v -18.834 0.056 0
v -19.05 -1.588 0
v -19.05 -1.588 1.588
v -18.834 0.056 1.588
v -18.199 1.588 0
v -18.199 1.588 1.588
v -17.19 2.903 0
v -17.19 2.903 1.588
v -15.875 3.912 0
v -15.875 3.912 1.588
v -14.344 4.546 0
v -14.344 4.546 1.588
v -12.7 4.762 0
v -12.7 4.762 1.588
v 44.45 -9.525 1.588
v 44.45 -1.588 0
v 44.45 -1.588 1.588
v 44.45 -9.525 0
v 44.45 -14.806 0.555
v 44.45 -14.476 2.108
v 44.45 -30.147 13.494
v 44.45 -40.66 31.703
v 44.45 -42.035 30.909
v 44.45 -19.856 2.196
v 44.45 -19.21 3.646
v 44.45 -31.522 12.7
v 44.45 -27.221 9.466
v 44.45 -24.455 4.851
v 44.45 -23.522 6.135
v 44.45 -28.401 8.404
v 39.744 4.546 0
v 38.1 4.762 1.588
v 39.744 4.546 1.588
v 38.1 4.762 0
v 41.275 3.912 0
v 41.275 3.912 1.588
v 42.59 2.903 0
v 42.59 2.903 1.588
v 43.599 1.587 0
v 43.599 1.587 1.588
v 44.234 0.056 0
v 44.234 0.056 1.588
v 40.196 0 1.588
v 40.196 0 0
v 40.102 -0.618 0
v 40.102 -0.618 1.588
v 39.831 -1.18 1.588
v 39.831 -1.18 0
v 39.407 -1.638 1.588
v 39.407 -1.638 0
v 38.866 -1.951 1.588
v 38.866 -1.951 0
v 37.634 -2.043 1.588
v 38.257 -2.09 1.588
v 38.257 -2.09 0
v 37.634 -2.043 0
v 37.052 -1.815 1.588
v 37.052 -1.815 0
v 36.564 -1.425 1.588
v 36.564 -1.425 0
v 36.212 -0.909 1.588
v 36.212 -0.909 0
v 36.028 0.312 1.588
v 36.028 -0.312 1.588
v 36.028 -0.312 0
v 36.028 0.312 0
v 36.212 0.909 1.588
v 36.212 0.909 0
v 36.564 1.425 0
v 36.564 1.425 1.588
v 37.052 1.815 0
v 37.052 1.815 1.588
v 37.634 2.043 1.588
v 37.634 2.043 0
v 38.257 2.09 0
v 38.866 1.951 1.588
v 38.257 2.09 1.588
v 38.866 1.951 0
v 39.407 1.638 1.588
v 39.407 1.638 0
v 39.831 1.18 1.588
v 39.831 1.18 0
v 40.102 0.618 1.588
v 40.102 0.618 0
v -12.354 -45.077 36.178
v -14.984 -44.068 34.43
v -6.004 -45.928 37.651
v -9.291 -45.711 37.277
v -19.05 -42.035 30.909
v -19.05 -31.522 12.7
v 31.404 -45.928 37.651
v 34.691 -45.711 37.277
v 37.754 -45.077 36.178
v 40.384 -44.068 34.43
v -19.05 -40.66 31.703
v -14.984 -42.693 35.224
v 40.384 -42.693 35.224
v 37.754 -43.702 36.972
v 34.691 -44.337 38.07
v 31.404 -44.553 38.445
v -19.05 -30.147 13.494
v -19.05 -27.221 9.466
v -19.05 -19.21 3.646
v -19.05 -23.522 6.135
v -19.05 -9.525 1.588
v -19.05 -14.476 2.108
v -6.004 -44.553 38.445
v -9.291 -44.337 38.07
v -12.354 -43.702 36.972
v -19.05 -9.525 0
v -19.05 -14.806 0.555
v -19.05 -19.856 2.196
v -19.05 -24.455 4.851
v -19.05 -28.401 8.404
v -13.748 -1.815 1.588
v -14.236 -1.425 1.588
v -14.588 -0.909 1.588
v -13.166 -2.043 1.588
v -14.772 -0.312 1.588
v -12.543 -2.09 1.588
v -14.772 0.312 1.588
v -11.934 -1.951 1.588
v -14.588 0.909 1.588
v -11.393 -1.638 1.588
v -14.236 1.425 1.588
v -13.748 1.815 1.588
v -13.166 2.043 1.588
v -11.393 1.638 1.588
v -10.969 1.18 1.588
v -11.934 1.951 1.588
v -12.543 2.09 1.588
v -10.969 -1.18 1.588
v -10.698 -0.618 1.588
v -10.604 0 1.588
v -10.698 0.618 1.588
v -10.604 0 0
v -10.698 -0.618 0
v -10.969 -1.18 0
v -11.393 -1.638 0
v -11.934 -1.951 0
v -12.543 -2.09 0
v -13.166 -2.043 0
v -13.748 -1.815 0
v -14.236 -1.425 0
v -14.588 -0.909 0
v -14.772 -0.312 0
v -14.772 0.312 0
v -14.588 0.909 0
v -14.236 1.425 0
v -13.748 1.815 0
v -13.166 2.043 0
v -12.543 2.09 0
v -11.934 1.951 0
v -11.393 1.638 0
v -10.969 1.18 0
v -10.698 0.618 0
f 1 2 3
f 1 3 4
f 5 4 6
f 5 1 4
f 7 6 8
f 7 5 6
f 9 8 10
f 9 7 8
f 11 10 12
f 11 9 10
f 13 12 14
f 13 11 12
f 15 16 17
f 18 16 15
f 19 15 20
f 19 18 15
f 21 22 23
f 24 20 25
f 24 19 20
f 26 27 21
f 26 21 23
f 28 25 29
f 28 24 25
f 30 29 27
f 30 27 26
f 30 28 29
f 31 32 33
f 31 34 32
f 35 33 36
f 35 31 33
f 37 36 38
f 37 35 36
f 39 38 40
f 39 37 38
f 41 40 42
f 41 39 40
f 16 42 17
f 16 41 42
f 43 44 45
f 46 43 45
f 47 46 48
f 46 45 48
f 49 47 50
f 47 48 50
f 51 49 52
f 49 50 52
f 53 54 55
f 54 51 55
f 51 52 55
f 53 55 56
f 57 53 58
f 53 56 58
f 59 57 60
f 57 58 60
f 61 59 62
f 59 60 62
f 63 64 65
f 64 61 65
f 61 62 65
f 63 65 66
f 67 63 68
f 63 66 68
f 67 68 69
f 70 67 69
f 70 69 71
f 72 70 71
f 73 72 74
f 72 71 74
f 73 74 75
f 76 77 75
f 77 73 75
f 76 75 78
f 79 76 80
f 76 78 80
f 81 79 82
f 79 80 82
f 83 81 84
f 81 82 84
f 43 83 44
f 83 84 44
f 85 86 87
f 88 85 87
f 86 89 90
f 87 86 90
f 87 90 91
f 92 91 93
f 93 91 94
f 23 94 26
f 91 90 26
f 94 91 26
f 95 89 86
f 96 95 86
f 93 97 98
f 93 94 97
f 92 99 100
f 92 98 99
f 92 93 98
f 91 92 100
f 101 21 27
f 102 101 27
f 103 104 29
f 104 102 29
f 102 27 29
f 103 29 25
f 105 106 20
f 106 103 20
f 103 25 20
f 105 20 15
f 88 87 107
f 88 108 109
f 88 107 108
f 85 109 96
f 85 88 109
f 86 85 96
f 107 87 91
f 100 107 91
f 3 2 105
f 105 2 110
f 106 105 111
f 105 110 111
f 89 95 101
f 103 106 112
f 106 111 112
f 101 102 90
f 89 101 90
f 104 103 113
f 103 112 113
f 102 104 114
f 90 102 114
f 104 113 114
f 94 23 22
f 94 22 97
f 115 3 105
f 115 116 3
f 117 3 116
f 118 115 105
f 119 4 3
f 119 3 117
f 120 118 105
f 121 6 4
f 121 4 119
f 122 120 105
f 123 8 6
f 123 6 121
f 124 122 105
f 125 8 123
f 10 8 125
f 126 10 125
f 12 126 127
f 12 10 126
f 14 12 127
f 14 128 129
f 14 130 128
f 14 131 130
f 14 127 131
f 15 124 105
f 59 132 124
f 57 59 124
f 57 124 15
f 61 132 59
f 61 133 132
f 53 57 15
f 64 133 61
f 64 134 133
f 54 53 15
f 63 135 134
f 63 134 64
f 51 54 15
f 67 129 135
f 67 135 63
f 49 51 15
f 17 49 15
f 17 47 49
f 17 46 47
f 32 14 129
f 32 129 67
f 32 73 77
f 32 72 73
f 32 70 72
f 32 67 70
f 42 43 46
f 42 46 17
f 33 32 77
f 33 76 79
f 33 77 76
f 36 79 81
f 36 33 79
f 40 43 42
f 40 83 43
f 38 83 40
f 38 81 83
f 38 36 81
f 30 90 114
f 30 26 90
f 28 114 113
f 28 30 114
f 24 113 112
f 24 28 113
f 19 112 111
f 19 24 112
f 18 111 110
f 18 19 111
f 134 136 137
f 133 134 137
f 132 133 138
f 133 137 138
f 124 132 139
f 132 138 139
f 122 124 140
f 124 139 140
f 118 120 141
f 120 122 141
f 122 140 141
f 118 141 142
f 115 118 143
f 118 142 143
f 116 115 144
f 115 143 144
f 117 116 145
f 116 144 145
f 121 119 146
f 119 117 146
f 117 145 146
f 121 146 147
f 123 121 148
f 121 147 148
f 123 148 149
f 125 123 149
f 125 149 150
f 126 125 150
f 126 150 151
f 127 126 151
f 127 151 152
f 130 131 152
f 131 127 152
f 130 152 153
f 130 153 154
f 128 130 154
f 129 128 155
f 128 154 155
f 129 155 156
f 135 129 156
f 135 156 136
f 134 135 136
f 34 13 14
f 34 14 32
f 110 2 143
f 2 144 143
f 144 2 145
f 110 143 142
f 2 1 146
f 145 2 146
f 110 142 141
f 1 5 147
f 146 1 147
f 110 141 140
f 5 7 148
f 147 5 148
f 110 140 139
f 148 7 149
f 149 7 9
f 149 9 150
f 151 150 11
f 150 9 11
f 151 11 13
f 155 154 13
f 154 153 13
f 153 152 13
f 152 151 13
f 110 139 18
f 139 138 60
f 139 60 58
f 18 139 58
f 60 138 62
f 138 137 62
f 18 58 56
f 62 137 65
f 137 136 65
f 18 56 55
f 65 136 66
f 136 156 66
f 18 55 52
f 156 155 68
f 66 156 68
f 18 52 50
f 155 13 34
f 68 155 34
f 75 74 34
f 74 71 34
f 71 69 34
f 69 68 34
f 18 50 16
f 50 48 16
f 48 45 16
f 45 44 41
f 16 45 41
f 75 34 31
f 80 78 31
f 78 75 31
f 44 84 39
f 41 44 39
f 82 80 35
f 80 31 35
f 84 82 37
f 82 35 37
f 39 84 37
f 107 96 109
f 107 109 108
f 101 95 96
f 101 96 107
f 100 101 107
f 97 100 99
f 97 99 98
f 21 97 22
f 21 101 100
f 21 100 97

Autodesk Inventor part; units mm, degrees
ref_plane "YZ Plane" through (0, 0, 0) normal (1, 0, 0) x (0, 1, 0)
ref_plane "XZ Plane" through (0, 0, 0) normal (0, 1, 0) x (-1, 0, 0)
ref_plane "XY Plane" through (0, 0, 0) normal (0, 0, 1) x (1, 0, 0)
sketch "Sketch1" plane through (0, 0, 0) normal (0, 0, 1) x (1, 0, 0)
  line L0 (-12.7, 4.7625) -> (38.1, 4.7625)
  line L1 (-15.875, -9.525) -> (44.45, -9.525)
  line L2 (-19.05, -1.5875) -> (-19.05, -26.8352)
  line L3 (44.45, -1.5875) -> (44.45, -30.4886)
  line L4 (-19.05, -9.525) -> (-15.875, -9.525)
  arc A0 (-12.7, 4.7625) -> (-19.05, -1.5875) centre (-12.7, -1.5875) ccw
  arc A1 (44.45, -1.5875) -> (38.1, 4.7625) centre (38.1, -1.5875) ccw
  line L5 (-19.05, -26.8352) -> (-19.05, -57.15)
  line L6 (-6.0043, -64.9352) -> (31.4043, -64.9352)
  line L7 (44.45, -57.15) -> (44.45, -30.4886)
  line L8 (-19.05, -57.15) -> (-14.9845, -61.2155)
  line L9 (-19.05, -57.15) -> (-13.3006, -57.15) construction
  line L10 (44.45, -57.15) -> (40.3845, -61.2155)
  line L11 (44.45, -57.15) -> (50.1994, -57.15) construction
  arc A2 (-14.9845, -61.2155) -> (-6.0043, -64.9352) centre (-6.0043, -52.2352) ccw
  arc A3 (31.4043, -64.9352) -> (40.3845, -61.2155) centre (31.4043, -52.2352) ccw
  circle A4 centre (-12.7, 0) radius 2.0955
  circle A5 centre (38.1, 0) radius 2.0955
  point P0 (0, 0)
  point P1 (25.4, 4.7625)
  point P2 (28.575, -33.6636)
  point P3 (-19.05, 4.7625)
  point P4 (44.45, 4.7625)
  point P5 (44.45, -30.1625)
  dimension "d10" = 6.35
  dimension "d13" = 45
  dimension "d14" = 135
  dimension "d15" = 12.7
  dimension "d16" = 4.191
  dimension "d17" = 4.191
extrude "Extrusion1" add sketch "Sketch1" along normal blind 1.5875
bend part "Bend Part1" radius 25.4 angle 60 line through (-15.875, -9.525, 0) along (1, 0, 0) centre toward (0, 0, 1) moving side (0, -1, 0) both sides no
equation "\"BendRadius\" = Thickness"
equation "\"BendReliefWidth\" = Thickness"
equation "\"BendReliefDepth\" = 0.5 * Thickness"
equation "\"CornerReliefSize\" = 4 * Thickness"
equation "\"MinimumRemnant\" = 2 * Thickness"
equation "\"TransitionRadius\" = BendRadius"
equation "\"JacobiRadiusSize\" = BendRadius"
equation "\"GapSize\" = Thickness"
equation "\"Thickness\" = 1.5875"
properties part number "wedge" material "Acetal Resin, White"
